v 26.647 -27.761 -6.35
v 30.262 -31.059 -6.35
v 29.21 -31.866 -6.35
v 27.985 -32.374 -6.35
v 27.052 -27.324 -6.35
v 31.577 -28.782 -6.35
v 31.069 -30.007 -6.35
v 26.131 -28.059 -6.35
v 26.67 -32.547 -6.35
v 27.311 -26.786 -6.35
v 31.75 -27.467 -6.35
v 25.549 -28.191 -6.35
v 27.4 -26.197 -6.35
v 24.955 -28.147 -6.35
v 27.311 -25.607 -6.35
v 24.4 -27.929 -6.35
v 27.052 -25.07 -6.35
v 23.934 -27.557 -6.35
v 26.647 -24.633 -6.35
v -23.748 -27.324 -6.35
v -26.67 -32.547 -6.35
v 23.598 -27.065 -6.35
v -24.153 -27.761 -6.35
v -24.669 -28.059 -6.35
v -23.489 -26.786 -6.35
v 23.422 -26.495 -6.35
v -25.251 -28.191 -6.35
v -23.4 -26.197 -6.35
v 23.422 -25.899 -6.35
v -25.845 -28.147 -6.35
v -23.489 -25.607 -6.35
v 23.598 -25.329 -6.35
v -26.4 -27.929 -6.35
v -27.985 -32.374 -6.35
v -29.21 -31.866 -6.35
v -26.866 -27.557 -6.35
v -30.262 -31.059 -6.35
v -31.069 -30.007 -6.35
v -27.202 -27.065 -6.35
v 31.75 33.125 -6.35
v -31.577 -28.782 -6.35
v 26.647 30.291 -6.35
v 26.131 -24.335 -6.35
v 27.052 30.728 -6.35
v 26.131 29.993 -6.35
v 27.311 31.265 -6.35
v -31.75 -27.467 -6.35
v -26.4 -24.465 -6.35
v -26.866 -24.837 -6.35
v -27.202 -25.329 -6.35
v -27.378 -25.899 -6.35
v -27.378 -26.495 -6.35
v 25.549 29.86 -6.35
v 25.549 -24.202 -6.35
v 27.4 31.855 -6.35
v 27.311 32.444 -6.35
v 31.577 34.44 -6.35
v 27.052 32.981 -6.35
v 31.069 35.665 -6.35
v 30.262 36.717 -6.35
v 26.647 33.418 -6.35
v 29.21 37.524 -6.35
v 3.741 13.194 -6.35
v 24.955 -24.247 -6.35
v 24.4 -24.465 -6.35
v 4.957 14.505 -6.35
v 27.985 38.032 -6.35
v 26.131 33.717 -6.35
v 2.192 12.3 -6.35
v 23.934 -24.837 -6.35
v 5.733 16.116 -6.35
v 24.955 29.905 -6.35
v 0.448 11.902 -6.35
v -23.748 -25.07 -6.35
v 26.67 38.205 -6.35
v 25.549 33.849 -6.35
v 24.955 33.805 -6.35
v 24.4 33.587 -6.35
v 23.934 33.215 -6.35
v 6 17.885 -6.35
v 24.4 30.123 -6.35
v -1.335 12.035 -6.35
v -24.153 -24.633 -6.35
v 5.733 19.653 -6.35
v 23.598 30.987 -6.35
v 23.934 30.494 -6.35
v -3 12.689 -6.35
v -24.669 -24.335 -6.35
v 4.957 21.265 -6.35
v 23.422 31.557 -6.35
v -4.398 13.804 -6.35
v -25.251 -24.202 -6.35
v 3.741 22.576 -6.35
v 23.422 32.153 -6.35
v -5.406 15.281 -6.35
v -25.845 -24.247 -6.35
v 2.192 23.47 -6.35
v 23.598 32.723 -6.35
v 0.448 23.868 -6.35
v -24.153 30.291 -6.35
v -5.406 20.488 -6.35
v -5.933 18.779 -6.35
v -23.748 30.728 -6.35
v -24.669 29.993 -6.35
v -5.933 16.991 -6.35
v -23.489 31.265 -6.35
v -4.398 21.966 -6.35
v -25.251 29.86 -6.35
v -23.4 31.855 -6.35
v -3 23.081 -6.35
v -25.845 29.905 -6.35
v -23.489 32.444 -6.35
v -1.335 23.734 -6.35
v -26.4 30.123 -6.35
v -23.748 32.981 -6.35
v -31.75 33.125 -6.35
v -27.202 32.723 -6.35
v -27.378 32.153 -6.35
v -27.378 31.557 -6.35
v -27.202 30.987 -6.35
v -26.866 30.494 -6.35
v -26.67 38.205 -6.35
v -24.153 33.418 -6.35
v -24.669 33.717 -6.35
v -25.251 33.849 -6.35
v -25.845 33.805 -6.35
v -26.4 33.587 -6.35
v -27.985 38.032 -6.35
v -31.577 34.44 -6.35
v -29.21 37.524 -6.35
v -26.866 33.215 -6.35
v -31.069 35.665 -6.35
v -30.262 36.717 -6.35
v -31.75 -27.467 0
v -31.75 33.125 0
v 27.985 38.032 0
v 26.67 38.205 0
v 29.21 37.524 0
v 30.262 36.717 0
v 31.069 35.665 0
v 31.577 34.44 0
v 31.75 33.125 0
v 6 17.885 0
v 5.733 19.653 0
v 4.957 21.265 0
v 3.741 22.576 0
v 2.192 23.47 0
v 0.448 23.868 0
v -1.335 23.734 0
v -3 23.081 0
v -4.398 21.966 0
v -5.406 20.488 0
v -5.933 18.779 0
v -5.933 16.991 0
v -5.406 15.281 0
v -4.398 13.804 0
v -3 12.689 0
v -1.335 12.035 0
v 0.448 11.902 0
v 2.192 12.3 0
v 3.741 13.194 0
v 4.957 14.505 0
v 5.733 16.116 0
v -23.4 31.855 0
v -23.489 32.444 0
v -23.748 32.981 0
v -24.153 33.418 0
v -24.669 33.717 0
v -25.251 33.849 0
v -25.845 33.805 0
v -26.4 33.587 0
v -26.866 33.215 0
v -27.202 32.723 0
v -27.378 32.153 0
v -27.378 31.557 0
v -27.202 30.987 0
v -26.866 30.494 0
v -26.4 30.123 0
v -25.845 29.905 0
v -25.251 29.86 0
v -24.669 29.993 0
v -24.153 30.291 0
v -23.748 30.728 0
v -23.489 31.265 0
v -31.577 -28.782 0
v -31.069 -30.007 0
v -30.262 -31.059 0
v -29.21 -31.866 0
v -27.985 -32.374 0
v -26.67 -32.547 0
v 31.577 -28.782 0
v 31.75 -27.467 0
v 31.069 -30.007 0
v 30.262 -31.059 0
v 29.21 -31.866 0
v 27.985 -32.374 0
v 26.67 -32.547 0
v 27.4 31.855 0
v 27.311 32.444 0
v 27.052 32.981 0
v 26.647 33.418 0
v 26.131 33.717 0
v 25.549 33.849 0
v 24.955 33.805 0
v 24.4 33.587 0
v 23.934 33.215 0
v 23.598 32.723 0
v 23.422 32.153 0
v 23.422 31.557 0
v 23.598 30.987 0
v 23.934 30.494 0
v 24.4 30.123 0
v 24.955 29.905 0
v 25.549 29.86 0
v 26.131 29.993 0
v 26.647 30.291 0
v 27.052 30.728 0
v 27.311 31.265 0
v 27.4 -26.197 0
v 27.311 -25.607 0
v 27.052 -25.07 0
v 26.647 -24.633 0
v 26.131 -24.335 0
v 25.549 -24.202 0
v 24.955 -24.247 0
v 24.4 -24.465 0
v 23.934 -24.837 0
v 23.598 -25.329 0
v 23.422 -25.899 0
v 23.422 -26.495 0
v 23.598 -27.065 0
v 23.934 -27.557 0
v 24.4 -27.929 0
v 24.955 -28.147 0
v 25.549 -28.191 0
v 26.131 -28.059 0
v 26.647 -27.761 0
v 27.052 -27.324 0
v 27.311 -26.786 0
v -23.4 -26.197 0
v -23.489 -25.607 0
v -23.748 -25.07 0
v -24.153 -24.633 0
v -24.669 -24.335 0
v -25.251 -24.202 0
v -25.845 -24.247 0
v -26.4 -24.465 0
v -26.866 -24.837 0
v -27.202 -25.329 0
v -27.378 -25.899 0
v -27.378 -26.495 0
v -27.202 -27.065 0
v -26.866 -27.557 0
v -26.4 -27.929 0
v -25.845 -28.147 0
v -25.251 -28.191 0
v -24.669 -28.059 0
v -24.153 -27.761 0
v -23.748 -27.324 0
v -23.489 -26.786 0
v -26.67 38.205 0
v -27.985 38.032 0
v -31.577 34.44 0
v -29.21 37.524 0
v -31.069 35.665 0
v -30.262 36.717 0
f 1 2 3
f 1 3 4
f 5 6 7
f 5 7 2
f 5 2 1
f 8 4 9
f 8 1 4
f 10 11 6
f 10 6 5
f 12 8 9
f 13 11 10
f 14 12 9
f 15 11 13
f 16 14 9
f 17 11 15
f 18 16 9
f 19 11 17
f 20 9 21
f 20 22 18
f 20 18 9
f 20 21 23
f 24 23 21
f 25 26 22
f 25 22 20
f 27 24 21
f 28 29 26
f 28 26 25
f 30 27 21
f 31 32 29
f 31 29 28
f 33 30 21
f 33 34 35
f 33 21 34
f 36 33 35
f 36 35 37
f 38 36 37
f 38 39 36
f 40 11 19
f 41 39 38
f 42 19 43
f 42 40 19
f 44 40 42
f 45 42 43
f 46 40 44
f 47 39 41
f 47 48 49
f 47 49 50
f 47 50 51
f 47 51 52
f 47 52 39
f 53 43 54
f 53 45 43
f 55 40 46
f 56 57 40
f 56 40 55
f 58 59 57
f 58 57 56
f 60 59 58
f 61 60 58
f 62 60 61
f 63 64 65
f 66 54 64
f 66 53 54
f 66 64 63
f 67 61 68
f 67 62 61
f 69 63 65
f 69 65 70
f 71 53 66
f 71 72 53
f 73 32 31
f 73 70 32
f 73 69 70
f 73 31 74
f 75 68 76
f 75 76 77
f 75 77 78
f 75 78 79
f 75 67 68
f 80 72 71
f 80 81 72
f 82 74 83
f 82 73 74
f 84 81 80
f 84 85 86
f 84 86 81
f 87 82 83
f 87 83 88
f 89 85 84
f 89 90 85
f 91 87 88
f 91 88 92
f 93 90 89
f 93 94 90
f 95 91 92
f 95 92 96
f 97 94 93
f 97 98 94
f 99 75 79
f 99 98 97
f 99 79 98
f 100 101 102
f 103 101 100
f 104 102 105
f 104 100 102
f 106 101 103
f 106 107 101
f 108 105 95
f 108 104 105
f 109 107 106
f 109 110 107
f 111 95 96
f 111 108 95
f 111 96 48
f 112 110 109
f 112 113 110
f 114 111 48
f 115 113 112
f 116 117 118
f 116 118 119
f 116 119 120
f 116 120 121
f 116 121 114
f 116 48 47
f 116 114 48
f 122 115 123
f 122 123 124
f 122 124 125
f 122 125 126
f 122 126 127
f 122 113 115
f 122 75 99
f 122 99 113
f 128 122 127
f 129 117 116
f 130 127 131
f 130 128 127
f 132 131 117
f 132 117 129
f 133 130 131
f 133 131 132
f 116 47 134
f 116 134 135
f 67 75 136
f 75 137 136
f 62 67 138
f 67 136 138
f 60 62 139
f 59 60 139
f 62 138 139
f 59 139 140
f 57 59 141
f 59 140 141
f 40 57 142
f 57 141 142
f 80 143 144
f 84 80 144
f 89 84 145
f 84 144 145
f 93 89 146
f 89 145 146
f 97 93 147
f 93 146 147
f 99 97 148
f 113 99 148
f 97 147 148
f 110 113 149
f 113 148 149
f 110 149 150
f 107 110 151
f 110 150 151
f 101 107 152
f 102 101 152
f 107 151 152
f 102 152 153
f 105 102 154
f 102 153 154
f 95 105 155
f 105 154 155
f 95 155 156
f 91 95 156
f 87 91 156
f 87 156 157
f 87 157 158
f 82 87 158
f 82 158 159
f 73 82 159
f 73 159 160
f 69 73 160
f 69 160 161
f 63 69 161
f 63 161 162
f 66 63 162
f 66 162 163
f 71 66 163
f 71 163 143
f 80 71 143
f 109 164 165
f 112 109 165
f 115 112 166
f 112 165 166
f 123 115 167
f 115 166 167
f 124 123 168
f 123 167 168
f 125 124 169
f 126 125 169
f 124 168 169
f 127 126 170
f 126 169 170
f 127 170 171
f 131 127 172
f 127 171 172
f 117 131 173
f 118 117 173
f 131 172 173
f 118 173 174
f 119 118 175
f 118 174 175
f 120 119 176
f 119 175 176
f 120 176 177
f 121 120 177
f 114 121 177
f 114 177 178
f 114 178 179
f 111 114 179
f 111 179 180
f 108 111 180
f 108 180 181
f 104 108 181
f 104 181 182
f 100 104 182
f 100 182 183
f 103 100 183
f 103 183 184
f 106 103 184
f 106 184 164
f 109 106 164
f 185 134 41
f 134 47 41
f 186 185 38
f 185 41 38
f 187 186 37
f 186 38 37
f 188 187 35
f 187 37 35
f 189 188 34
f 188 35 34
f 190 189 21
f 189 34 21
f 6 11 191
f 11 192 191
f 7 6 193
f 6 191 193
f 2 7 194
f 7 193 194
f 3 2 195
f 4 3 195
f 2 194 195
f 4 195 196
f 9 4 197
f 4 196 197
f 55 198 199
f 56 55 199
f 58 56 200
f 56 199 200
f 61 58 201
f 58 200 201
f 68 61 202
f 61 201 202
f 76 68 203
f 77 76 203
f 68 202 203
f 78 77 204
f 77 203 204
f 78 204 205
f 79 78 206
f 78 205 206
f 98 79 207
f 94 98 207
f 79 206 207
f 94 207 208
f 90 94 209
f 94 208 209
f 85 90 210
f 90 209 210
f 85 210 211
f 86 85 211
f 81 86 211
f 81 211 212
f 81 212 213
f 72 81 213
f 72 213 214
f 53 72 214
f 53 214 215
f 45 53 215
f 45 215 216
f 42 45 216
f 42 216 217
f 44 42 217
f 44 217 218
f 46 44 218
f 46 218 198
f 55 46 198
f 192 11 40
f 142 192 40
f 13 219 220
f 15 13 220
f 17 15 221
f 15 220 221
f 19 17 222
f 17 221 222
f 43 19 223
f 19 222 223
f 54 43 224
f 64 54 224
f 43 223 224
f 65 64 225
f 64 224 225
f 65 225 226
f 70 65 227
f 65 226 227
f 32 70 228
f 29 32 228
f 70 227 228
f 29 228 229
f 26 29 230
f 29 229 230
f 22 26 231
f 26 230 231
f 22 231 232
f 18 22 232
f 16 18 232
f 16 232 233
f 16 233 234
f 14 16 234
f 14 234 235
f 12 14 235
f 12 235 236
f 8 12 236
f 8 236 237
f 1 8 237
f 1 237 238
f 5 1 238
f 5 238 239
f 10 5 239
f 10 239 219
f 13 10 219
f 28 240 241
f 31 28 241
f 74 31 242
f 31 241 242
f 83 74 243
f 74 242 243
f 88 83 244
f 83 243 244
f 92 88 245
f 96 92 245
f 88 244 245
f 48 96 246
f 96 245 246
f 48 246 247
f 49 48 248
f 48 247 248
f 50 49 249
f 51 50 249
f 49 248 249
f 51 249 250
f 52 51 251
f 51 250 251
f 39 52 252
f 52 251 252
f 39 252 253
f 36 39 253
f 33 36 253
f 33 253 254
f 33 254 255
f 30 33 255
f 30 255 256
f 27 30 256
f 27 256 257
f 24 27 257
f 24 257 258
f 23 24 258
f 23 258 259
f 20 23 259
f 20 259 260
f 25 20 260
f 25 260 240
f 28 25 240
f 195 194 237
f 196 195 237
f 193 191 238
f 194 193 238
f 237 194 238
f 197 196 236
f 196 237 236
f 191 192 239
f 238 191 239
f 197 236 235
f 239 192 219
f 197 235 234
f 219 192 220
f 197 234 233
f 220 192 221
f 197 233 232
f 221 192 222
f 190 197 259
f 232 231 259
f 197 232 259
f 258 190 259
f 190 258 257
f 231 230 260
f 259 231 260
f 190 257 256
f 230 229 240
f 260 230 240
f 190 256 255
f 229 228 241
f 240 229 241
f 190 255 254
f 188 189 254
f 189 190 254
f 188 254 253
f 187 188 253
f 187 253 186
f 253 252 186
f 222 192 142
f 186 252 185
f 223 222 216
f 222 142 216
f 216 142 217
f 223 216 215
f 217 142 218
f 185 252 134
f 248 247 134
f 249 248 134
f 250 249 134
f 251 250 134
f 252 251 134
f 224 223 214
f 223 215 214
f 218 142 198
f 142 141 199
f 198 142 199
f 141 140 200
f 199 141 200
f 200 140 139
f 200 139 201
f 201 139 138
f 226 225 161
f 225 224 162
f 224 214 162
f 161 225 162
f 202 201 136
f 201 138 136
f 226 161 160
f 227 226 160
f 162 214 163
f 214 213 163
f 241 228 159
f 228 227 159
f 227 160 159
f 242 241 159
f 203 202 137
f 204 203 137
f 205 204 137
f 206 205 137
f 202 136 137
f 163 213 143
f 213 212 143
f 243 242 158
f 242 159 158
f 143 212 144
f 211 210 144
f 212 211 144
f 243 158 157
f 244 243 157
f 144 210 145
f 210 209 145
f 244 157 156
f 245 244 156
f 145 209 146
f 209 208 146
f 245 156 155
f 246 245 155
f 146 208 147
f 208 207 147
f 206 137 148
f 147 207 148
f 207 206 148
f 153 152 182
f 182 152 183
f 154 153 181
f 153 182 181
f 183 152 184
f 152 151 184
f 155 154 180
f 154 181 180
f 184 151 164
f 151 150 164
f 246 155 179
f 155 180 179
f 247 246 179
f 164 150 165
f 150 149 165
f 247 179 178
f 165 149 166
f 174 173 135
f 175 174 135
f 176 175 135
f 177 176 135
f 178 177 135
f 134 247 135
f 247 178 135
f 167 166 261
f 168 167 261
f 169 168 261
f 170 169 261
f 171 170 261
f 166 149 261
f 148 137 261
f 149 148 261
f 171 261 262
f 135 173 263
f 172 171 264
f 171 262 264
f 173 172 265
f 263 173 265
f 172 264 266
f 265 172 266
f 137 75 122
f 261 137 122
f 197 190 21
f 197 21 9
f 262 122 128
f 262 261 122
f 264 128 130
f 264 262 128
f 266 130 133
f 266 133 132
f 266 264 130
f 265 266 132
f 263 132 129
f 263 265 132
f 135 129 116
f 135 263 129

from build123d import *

# Parameters (mm, degrees)
BOSS_EXTRUDE1_DEPTH = 6.35
SKETCH2_R           = 1.35
SKETCH2_R_2         = 1.385
CUT_EXTRUDE1_DEPTH  = 38.116505762
SKETCH3_W           = 63.5
SKETCH3_H           = 71.12
SKETCH3_W_2         = 38.321076004
SKETCH3_H_2         = 47.237540142
BOSS_EXTRUDE2_DEPTH = 6.35
SKETCH5_W           = 27.94
SKETCH5_H           = 55.88
CUT_EXTRUDE3_DEPTH  = 51.07984184
SKETCH7_W           = 69.85
SKETCH7_H           = 0.368341575
CUT_EXTRUDE4_DEPTH  = 10
SKETCH9_R           = 2
CUT_EXTRUDE5_DEPTH  = 51.07984184
SKETCH10_W          = 41.322373354
SKETCH10_H          = 59.668082212
BOSS_EXTRUDE3_DEPTH = 6.35
SKETCH11_R          = 6
CUT_EXTRUDE6_DEPTH  = 51.07984184
FILLET1_R           = 5.08
FILLET2_R           = 5.08
FILLET3_R           = 5.08


with BuildPart() as part:
    # Sketch1 → Boss-Extrude1 (new body)
    with BuildSketch(Plane.XY):
        with BuildLine():
            Line((-19.69889026, 23.2987845), (-14.850045261, 29.75147823))
            ThreePointArc((-14.850045261, 29.75147823), (-14.144755454, 30.339267512), (-13.251155001, 30.55))
            Line((-13.251155001, 30.55), (13.251155001, 30.55))
            ThreePointArc((13.251155001, 30.55), (14.144755454, 30.339267512), (14.850045261, 29.75147823))
            Line((14.850045261, 29.75147823), (19.69889026, 23.2987845))
            ThreePointArc((19.69889026, 23.2987845), (19.997074131, 22.730638521), (20.1, 22.09730627))
            Line((20.1, 22.09730627), (20.1, -22.09730627))
            ThreePointArc((20.1, -22.09730627), (19.997074131, -22.730638521), (19.69889026, -23.2987845))
            Line((19.69889026, -23.2987845), (14.850045261, -29.75147823))
            ThreePointArc((14.850045261, -29.75147823), (14.144755454, -30.339267512), (13.251155001, -30.55))
            Line((13.251155001, -30.55), (-13.251155001, -30.55))
            ThreePointArc((-13.251155001, -30.55), (-14.144755454, -30.339267512), (-14.850045261, -29.75147823))
            Line((-14.850045261, -29.75147823), (-19.69889026, -23.2987845))
            ThreePointArc((-19.69889026, -23.2987845), (-19.997074131, -22.730638521), (-20.1, -22.09730627))
            Line((-20.1, -22.09730627), (-20.1, 22.09730627))
            ThreePointArc((-20.1, 22.09730627), (-19.997074131, 22.730638521), (-19.69889026, 23.2987845))
        make_face()
    extrude(amount=-BOSS_EXTRUDE1_DEPTH)

    # Sketch2 → Cut-Extrude1 (cut, through all)
    with BuildSketch(Plane(origin=(0, 0, -6.35), x_dir=(-1, 0, 0), z_dir=(0, 0, -1))):
        with Locations((17.3, 21.9487845)):
            Circle(SKETCH2_R)
        with Locations((17.3, -0.0512155)):
            Circle(SKETCH2_R)
        with Locations((17.3, -22.0512155)):
            Circle(SKETCH2_R)
        with Locations((11, -27.75)):
            Circle(SKETCH2_R_2)
        with Locations(Location((-11, -27.75, 0), (0, 0, 180))):
            Circle(SKETCH2_R_2)
        with Locations(Location((-17.3, -22.0512155, 0), (0, 0, 180))):
            Circle(SKETCH2_R)
        with Locations(Location((-17.3, -0.0512155, 0), (0, 0, 180))):
            Circle(SKETCH2_R)
        with Locations(Location((-17.3, 21.9487845, 0), (0, 0, 180))):
            Circle(SKETCH2_R)
    extrude(amount=-CUT_EXTRUDE1_DEPTH, mode=Mode.SUBTRACT)

    # Sketch3 → Boss-Extrude2 (add)
    with BuildSketch(Plane(origin=(0, 0, -6.35), x_dir=(-1, 0, 0), z_dir=(0, 0, -1))):
        with Locations((0, 2.6447845)):
            Rectangle(SKETCH3_W, SKETCH3_H)
        Rectangle(SKETCH3_W_2, SKETCH3_H_2, mode=Mode.SUBTRACT)
    extrude(amount=-BOSS_EXTRUDE2_DEPTH)

    # Sketch5 → Cut-Extrude3 (cut, through all)
    with BuildSketch(Plane.XY):
        with Locations((0, 3.0087845)):
            Rectangle(SKETCH5_W, SKETCH5_H)
    extrude(amount=-CUT_EXTRUDE3_DEPTH, mode=Mode.SUBTRACT)

    # Sketch7 → Cut-Extrude4 (cut)
    with BuildSketch(Plane.XY):
        with Locations((3.175, -32.731044713)):
            Rectangle(SKETCH7_W, SKETCH7_H)
    extrude(amount=-CUT_EXTRUDE4_DEPTH, mode=Mode.SUBTRACT)

    # Sketch9 → Cut-Extrude5 (cut, through all)
    with BuildSketch(Plane.XY):
        with Locations((25.4, 31.8547845)):
            Circle(SKETCH9_R)
        with Locations((-25.4, 31.8547845)):
            Circle(SKETCH9_R)
        with Locations((-25.4, -26.196873925)):
            Circle(SKETCH9_R)
        with Locations((25.4, -26.196873925)):
            Circle(SKETCH9_R)
    extrude(amount=-CUT_EXTRUDE5_DEPTH, mode=Mode.SUBTRACT)

    # Sketch10 → Boss-Extrude3 (add)
    with BuildSketch(Plane(origin=(0, 0, -6.35), x_dir=(-1, 0, 0), z_dir=(0, 0, -1))):
        with Locations((0, 2.205557414)):
            Rectangle(SKETCH10_W, SKETCH10_H)
    extrude(amount=-BOSS_EXTRUDE3_DEPTH)

    # Sketch11 → Cut-Extrude6 (cut, through all)
    with BuildSketch(Plane.XY):
        with Locations((0, 17.8847845)):
            Circle(SKETCH11_R)
    extrude(amount=-CUT_EXTRUDE6_DEPTH, mode=Mode.SUBTRACT)

    # Fillet1
    fillet1_edges = [part.edges().sort_by_distance(p)[0] for p in [
        (-31.75, 38.2047845, -3.175),
    ]]
    fillet(fillet1_edges, radius=FILLET1_R)

    # Fillet2
    fillet2_edges = [part.edges().sort_by_distance(p)[0] for p in [
        (31.75, -32.546873925, -3.175),
        (31.75, 38.2047845, -3.175),
    ]]
    fillet(fillet2_edges, radius=FILLET2_R)

    # Fillet3
    fillet3_edges = [part.edges().sort_by_distance(p)[0] for p in [
        (-31.75, -32.546873925, -3.175),
    ]]
    fillet(fillet3_edges, radius=FILLET3_R)


solid = part.part
